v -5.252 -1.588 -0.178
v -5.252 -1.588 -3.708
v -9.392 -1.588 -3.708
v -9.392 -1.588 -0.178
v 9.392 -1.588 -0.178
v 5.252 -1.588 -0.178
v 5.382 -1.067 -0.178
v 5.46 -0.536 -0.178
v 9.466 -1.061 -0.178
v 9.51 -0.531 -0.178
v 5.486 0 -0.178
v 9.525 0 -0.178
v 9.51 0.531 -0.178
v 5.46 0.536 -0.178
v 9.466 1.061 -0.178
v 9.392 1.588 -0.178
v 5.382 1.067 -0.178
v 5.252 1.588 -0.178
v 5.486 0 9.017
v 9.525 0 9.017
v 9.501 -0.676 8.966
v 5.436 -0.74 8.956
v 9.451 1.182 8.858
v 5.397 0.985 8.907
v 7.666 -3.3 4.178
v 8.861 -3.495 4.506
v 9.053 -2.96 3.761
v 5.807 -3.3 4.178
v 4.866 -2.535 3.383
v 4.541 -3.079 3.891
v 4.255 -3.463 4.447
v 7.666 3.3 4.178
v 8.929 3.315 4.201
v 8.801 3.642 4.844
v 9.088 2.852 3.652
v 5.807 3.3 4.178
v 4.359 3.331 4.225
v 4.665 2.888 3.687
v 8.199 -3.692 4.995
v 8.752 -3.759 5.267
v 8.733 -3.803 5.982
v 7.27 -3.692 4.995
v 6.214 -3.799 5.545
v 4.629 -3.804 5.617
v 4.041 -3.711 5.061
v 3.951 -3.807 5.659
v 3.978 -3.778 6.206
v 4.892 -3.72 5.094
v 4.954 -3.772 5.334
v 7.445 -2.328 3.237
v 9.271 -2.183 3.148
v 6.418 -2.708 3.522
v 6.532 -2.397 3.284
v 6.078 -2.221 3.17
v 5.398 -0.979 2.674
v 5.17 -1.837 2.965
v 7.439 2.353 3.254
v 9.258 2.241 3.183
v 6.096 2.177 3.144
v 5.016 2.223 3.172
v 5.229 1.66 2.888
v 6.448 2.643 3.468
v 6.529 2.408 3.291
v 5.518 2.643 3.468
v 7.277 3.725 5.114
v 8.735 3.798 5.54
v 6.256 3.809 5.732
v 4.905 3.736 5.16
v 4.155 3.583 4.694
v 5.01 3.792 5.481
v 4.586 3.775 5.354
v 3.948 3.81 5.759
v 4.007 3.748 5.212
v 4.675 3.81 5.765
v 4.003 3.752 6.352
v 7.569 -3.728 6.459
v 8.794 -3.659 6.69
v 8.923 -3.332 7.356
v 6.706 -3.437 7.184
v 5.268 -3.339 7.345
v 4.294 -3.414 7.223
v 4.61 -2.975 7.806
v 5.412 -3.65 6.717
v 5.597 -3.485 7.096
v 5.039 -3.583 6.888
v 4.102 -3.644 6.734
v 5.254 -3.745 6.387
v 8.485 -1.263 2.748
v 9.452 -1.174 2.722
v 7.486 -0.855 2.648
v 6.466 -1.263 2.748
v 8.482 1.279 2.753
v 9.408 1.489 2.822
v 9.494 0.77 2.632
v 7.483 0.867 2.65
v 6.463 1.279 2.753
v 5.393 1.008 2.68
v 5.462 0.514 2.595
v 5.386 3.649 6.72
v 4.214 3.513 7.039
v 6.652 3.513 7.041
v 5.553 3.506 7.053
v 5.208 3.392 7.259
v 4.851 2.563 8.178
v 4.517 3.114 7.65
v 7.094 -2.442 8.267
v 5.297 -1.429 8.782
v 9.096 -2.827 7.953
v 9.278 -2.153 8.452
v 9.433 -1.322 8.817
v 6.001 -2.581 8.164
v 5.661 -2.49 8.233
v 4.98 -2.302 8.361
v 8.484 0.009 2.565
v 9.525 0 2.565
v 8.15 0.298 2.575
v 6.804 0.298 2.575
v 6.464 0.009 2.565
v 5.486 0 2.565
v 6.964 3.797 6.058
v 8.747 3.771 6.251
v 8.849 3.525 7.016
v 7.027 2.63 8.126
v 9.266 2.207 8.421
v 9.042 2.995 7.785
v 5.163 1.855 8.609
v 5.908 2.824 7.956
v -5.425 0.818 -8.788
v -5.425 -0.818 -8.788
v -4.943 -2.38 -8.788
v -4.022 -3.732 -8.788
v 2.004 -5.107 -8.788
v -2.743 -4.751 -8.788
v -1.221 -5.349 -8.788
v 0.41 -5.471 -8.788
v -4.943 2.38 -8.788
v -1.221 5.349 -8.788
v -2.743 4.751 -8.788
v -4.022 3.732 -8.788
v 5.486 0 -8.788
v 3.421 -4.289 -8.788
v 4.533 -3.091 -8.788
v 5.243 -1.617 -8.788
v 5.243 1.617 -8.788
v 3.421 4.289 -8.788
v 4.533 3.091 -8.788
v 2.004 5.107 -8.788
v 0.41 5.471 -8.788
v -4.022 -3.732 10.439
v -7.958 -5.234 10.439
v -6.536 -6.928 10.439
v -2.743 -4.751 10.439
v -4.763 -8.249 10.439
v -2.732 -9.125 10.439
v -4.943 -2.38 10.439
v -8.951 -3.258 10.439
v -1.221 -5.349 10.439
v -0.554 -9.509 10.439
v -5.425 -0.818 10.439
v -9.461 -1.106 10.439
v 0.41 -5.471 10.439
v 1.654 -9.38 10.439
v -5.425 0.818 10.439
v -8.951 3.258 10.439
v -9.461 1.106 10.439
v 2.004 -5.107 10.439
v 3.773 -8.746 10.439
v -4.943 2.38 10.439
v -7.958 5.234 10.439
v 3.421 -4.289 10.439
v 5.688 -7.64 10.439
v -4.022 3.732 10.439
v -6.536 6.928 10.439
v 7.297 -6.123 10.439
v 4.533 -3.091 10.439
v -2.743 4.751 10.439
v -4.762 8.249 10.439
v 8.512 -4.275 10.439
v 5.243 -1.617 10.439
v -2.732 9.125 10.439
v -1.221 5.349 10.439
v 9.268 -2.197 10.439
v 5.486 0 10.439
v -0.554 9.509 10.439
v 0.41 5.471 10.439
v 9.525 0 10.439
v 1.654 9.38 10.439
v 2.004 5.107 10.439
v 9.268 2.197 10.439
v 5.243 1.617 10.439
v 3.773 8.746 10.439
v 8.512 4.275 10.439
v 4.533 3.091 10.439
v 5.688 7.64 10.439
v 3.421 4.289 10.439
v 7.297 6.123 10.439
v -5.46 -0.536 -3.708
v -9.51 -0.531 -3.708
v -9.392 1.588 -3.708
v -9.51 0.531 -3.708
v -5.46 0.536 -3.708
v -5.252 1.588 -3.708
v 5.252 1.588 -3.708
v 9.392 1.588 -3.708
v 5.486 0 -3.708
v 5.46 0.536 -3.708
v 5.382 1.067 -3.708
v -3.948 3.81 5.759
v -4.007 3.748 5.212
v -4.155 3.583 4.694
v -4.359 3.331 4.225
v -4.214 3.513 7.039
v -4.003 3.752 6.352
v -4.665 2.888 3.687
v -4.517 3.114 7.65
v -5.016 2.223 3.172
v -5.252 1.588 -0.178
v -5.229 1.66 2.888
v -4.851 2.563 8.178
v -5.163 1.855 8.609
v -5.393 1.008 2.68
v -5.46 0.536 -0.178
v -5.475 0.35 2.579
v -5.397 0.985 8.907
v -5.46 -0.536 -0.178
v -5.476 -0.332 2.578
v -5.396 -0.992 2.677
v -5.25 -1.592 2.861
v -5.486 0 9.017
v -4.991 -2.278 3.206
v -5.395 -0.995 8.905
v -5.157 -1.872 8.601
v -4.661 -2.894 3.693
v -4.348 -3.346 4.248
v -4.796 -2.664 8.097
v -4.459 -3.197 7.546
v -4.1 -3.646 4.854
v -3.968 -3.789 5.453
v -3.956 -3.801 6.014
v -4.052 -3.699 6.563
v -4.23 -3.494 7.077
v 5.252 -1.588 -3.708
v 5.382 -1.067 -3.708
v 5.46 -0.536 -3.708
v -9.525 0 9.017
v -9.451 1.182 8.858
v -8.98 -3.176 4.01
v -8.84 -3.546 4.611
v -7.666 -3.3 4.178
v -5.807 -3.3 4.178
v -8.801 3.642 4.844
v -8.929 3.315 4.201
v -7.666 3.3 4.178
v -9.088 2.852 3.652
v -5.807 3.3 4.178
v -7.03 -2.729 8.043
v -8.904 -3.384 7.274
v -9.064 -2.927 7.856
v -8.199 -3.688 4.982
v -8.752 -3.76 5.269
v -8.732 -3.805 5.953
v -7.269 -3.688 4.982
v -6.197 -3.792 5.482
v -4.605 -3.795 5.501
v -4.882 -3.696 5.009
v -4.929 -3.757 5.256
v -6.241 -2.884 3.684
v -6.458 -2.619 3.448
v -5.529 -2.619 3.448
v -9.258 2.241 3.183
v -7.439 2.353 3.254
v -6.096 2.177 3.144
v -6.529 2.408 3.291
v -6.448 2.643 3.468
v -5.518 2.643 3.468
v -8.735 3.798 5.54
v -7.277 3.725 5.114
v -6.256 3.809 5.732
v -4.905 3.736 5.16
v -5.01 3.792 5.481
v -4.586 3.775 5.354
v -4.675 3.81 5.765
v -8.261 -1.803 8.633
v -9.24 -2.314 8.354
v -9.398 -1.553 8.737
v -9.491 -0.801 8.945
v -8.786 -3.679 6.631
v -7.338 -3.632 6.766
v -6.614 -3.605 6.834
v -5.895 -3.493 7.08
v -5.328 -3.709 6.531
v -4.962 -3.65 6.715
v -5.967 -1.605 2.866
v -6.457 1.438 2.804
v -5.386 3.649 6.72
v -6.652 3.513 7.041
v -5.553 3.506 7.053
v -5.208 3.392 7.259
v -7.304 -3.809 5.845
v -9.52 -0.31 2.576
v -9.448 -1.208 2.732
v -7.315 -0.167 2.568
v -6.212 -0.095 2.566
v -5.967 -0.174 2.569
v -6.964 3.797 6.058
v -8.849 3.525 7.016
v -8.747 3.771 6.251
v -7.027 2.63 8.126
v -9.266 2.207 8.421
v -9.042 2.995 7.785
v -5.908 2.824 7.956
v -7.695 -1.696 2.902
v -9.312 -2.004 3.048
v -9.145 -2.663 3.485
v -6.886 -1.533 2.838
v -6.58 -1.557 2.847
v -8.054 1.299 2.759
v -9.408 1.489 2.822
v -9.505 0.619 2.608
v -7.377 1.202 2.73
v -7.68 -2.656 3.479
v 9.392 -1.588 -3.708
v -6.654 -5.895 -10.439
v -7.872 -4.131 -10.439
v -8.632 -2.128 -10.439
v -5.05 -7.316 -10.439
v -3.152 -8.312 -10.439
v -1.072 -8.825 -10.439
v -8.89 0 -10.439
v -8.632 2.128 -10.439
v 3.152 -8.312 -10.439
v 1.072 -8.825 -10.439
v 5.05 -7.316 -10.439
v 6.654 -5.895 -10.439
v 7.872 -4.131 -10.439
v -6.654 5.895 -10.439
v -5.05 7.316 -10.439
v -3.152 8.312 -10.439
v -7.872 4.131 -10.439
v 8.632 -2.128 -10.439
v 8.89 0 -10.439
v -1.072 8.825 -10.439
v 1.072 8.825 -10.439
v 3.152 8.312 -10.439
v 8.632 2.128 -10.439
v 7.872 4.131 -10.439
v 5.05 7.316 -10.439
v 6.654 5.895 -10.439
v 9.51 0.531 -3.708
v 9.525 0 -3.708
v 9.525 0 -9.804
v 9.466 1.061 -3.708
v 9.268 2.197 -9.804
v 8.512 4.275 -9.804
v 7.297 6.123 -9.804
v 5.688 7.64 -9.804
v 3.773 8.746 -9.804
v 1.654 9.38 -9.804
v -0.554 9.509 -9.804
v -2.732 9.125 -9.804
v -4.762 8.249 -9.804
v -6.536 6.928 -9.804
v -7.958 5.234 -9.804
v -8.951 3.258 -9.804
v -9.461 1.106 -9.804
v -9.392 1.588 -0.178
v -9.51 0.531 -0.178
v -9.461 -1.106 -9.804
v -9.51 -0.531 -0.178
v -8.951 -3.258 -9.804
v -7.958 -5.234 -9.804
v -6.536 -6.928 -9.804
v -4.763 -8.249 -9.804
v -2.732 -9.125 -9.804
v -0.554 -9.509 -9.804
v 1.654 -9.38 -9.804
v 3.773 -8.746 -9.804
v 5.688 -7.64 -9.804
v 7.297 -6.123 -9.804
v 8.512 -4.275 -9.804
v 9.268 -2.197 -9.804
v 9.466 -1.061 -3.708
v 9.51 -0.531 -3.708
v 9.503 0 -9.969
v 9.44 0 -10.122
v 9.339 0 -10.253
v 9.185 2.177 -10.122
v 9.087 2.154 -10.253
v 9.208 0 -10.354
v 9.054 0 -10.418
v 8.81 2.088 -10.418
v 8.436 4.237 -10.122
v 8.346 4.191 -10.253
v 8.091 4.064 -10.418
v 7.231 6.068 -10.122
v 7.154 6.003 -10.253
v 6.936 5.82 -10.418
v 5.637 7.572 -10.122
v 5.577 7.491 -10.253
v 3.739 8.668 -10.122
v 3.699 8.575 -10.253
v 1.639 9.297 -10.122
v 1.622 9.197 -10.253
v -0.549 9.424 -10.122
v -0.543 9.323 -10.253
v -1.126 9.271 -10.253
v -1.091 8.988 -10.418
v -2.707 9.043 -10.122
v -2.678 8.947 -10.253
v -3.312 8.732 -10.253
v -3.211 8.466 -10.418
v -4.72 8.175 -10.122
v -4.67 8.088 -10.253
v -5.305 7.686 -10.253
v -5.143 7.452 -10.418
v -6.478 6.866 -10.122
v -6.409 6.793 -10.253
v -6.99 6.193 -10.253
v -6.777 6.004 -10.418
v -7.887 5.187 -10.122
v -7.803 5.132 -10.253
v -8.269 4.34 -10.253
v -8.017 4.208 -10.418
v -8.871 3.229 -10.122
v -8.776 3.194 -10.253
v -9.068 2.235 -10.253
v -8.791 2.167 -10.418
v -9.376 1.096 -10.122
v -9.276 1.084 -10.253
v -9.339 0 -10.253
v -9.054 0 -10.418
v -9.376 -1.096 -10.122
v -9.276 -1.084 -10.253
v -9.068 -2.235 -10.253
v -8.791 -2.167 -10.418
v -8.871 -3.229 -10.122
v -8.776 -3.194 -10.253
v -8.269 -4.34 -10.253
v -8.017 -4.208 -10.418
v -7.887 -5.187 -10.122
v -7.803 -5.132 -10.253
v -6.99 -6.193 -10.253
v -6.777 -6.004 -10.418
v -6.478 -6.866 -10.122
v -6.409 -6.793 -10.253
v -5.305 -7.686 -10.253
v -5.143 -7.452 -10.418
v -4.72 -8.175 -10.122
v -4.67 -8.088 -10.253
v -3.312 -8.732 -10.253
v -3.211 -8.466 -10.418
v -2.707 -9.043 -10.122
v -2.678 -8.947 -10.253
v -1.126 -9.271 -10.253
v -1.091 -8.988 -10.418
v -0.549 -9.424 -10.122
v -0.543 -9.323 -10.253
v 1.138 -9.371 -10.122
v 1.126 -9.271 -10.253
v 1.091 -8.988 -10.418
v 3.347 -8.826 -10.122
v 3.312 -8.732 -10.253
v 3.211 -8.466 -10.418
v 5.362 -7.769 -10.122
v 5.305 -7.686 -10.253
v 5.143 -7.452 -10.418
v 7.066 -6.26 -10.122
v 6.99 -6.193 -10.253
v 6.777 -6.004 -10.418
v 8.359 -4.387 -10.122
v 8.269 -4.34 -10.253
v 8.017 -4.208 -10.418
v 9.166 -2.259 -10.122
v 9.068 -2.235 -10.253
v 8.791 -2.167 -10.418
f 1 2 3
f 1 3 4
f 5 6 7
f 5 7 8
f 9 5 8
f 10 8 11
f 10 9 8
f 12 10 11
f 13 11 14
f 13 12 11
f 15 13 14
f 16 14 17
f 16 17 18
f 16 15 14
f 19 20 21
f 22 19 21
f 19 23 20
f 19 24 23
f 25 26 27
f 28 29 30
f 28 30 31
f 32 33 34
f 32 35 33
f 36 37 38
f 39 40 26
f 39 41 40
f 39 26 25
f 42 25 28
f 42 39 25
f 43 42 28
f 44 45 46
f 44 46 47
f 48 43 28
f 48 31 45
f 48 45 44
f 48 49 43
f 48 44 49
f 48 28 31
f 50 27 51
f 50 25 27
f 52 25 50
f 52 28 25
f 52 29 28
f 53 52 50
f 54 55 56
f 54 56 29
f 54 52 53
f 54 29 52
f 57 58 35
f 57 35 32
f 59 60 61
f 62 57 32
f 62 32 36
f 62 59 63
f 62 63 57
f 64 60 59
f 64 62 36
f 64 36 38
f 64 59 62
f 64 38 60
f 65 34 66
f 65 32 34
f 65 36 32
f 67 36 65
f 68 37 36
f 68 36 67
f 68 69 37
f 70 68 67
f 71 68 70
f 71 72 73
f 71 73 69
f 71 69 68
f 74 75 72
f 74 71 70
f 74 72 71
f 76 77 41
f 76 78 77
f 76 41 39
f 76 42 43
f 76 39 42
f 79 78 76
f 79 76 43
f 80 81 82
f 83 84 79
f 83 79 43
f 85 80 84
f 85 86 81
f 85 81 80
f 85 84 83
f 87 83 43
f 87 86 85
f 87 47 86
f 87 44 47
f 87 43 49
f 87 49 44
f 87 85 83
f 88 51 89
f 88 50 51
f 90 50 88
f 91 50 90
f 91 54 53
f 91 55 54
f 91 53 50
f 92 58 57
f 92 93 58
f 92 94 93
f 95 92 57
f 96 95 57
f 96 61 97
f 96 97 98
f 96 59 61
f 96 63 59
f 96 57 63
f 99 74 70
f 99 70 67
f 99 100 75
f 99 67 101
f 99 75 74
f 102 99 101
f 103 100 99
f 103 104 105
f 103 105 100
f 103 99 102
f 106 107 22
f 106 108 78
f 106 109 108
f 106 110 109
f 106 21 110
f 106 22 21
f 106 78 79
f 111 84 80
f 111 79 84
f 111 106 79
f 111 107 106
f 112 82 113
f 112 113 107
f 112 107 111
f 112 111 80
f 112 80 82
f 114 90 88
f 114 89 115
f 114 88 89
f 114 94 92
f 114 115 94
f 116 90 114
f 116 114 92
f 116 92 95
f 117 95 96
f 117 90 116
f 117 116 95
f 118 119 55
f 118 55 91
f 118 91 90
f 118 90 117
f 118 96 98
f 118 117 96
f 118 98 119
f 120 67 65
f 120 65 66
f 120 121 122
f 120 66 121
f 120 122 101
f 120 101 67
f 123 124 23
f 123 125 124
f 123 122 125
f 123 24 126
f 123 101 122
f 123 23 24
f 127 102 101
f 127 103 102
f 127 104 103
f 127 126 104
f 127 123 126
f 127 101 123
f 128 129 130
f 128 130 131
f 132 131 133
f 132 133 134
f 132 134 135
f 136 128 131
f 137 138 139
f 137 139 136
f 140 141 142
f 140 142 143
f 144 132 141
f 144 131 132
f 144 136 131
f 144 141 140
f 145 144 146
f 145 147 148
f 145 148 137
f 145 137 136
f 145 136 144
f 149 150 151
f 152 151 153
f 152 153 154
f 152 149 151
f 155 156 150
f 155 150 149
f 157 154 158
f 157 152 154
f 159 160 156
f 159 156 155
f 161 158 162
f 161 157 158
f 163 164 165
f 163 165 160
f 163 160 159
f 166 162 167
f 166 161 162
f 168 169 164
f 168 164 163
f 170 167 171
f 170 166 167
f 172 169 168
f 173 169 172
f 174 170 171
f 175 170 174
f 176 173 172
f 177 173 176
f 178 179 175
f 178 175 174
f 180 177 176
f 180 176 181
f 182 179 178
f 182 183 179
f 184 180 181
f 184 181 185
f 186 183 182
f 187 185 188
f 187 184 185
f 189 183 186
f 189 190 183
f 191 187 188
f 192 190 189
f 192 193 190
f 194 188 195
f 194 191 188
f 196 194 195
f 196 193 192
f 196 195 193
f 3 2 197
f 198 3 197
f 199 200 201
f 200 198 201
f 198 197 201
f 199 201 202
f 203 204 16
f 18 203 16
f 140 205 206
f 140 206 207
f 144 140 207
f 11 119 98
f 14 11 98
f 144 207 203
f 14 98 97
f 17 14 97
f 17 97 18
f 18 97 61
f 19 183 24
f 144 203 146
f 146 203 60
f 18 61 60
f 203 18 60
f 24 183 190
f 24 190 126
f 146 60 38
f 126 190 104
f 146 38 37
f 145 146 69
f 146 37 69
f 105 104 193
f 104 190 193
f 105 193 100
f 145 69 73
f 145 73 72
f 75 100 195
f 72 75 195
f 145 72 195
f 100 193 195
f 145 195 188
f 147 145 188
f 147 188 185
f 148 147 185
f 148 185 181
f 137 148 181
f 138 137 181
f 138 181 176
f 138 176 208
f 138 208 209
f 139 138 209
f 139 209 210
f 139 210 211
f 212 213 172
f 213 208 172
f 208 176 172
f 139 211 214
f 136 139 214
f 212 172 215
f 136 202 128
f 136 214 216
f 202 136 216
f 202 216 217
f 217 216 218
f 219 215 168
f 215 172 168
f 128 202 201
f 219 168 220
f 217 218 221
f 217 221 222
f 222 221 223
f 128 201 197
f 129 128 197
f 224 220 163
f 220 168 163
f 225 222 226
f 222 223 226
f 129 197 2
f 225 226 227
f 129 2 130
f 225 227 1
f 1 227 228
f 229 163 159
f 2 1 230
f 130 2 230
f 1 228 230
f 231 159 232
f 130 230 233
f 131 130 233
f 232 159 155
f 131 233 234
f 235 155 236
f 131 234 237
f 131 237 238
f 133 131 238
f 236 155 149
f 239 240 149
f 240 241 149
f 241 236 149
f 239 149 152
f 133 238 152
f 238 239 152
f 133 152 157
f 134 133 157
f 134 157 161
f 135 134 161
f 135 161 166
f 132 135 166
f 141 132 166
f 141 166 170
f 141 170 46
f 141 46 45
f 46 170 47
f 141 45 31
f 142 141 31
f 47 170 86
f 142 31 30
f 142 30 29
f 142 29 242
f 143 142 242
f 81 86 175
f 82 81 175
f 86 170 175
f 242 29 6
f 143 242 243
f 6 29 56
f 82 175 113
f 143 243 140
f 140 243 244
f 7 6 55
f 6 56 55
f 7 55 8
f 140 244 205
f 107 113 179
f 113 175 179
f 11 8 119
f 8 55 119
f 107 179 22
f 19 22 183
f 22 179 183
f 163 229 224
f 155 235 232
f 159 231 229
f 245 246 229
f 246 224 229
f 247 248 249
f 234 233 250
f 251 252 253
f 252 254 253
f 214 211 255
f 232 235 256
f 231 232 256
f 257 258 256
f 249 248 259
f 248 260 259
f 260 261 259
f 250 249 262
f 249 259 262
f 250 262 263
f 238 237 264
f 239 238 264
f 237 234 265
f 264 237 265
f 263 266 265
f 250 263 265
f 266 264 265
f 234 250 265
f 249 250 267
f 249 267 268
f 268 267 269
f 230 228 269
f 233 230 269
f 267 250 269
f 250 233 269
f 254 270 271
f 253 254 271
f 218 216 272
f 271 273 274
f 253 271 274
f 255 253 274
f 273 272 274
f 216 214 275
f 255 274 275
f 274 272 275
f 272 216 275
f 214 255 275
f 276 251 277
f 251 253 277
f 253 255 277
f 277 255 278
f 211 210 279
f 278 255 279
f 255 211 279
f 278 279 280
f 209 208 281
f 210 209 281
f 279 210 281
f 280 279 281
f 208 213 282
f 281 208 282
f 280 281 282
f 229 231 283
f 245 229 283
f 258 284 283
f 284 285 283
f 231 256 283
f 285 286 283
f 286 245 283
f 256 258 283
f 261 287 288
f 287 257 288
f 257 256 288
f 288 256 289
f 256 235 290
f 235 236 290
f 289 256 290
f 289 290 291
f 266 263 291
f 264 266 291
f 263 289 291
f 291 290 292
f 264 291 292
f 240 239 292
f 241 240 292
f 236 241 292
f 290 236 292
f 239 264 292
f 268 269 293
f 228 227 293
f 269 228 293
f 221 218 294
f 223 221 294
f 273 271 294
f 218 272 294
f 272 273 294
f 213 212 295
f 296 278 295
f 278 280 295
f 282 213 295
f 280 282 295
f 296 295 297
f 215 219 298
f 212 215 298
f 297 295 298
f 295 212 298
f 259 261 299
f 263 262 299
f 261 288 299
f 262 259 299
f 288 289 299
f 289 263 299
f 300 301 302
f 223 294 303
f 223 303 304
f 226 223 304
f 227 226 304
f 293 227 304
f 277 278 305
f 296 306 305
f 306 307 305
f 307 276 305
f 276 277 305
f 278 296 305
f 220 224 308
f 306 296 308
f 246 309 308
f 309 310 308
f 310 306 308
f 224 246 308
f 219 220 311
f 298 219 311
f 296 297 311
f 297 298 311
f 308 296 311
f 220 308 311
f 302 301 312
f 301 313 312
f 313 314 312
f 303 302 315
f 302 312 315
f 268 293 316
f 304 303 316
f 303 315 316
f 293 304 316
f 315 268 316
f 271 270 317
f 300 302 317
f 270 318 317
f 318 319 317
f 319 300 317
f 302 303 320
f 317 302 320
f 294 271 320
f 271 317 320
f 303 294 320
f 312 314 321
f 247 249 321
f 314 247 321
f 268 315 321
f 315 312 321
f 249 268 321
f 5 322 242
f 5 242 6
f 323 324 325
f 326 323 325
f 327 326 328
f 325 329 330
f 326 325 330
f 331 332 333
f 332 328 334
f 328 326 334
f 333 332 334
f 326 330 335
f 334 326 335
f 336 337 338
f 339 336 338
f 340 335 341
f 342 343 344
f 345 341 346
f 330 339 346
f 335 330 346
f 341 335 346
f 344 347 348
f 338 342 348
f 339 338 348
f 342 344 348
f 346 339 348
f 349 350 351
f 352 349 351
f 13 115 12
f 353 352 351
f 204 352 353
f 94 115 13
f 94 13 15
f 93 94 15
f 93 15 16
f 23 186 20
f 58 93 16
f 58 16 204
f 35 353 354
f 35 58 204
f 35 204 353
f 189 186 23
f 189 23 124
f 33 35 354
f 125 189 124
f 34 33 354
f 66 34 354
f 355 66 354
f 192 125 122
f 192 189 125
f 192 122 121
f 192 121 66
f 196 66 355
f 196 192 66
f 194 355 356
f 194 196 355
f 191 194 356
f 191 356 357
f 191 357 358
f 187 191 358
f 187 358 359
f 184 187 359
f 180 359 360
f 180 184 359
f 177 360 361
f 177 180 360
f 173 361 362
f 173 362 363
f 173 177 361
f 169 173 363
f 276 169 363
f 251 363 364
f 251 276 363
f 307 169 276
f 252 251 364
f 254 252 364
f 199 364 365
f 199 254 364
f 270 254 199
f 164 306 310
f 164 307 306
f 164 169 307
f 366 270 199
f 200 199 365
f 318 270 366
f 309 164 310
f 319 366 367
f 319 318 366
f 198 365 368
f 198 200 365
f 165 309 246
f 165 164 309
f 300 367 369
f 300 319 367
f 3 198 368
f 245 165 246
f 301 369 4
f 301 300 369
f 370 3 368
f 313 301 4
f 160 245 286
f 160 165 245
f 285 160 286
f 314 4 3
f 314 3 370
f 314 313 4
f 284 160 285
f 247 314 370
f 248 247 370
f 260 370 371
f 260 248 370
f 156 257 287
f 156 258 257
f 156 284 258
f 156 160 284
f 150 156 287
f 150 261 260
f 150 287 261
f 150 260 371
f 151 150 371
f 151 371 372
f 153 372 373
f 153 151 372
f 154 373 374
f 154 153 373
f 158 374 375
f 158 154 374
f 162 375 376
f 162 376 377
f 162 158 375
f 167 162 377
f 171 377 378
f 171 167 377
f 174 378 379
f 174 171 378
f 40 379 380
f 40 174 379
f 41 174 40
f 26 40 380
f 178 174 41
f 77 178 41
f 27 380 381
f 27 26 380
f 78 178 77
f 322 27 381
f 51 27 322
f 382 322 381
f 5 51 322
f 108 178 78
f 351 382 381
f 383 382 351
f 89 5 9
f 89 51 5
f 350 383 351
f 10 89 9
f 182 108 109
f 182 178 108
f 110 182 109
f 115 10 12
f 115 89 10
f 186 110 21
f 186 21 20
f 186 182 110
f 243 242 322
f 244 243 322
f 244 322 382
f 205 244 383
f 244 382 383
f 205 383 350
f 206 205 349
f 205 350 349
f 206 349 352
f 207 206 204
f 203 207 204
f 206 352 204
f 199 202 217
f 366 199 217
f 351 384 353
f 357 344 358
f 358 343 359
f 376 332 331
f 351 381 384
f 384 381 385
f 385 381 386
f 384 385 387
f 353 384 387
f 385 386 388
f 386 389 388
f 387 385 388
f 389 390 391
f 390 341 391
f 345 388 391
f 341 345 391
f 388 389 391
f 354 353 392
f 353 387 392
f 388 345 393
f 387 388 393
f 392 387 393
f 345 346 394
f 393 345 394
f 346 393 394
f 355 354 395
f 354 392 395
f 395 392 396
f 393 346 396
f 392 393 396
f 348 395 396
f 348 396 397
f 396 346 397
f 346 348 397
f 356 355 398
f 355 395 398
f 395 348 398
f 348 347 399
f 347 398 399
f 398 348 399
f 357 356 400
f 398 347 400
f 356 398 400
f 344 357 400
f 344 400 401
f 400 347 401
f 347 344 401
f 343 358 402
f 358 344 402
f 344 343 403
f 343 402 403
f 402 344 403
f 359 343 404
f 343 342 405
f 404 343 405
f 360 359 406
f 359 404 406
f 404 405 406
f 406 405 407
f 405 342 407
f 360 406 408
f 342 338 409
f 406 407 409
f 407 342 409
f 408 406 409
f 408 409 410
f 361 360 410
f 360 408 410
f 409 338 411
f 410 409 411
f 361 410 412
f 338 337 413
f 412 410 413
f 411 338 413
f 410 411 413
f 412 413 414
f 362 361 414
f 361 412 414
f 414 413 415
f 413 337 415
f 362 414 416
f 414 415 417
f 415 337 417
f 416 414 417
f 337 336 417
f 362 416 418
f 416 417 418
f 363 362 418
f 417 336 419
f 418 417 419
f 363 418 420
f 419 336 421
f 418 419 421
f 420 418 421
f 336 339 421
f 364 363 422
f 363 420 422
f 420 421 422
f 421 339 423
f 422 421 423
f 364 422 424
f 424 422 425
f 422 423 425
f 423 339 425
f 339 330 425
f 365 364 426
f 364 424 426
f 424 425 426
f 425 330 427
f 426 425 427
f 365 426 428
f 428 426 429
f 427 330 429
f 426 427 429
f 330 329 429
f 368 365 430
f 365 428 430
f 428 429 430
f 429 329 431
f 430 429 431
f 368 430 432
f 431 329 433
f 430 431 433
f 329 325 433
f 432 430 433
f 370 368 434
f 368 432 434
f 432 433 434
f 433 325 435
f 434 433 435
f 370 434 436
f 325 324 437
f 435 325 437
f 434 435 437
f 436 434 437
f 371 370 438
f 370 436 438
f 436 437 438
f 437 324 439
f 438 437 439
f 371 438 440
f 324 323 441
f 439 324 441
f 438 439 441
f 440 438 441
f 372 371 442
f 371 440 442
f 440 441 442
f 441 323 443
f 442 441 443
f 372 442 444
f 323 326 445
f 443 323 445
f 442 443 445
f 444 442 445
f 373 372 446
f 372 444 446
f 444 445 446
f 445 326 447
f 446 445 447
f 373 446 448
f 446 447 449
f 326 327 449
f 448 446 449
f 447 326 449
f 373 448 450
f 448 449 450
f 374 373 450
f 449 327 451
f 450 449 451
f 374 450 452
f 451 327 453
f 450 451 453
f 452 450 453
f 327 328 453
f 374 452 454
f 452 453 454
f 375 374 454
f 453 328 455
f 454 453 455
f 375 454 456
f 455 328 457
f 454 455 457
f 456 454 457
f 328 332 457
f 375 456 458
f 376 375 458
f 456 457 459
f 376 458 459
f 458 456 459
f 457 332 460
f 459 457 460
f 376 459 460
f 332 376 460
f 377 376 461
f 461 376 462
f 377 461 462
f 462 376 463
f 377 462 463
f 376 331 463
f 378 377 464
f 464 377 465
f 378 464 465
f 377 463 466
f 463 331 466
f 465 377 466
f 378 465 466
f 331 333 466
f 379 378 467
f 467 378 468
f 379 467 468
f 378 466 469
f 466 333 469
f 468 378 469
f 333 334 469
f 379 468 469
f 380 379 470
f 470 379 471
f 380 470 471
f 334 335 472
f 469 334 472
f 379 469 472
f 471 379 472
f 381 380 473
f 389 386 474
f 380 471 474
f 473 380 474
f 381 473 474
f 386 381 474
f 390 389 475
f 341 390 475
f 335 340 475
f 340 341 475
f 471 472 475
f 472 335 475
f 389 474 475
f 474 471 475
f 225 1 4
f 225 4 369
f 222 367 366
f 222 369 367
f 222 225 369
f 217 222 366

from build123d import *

# Parameters (mm, degrees)
F0_R     = 9.525
F1_DEPTH = 10.4394
F2_R     = 5.4864
F3_DEPTH = 19.2278
F4_W     = 3.175
F4_H     = 3.5306
F5_DEPTH = 12.7
F7_DEPTH = 12.7
F8_R     = 0.635


with BuildPart() as f1:
    # F0 (on Top) → F1 (new body, symmetric)
    with BuildSketch(Plane.XY):
        Circle(F0_R)
    extrude(amount=F1_DEPTH, both=True)

    # F2 (on face) → F3 (cut)
    with BuildSketch(Plane.XY.offset(10.4394)):
        Circle(F2_R)
    extrude(amount=-F3_DEPTH, mode=Mode.SUBTRACT)

    # F4 (on Right) → F5 (cut, symmetric)
    with BuildSketch(Plane.YZ):
        with Locations((0, -1.9431)):
            Rectangle(F4_W, F4_H)
    extrude(amount=F5_DEPTH, both=True, mode=Mode.SUBTRACT)

    # F6 (on Right) → F7 (cut, symmetric)
    with BuildSketch(Plane.YZ):
        with BuildLine():
            add(Edge.make_bspline(
                [(0, 9.017), (-6.5991135768, 9.017), (-3.2995567884, 4.1783), (0, -0.6604), (3.2995567884, 4.1783), (6.5991135768, 9.017), (0, 9.017)],
                knots=[4.7123889804, 4.7123889804, 4.7123889804, 6.8067840828, 6.8067840828, 8.9011791852, 8.9011791852, 10.9955742876, 10.9955742876, 10.9955742876], degree=2, weights=[1, 0.5, 1, 0.5, 1, 0.5, 1]))
        make_face()
    extrude(amount=F7_DEPTH, both=True, mode=Mode.SUBTRACT)

    # F8
    f8_edges = [f1.edges().sort_by_distance(p)[0] for p in [
        (-9.525, 0, -10.4394),
    ]]
    fillet(f8_edges, radius=F8_R)


solid = f1.part
